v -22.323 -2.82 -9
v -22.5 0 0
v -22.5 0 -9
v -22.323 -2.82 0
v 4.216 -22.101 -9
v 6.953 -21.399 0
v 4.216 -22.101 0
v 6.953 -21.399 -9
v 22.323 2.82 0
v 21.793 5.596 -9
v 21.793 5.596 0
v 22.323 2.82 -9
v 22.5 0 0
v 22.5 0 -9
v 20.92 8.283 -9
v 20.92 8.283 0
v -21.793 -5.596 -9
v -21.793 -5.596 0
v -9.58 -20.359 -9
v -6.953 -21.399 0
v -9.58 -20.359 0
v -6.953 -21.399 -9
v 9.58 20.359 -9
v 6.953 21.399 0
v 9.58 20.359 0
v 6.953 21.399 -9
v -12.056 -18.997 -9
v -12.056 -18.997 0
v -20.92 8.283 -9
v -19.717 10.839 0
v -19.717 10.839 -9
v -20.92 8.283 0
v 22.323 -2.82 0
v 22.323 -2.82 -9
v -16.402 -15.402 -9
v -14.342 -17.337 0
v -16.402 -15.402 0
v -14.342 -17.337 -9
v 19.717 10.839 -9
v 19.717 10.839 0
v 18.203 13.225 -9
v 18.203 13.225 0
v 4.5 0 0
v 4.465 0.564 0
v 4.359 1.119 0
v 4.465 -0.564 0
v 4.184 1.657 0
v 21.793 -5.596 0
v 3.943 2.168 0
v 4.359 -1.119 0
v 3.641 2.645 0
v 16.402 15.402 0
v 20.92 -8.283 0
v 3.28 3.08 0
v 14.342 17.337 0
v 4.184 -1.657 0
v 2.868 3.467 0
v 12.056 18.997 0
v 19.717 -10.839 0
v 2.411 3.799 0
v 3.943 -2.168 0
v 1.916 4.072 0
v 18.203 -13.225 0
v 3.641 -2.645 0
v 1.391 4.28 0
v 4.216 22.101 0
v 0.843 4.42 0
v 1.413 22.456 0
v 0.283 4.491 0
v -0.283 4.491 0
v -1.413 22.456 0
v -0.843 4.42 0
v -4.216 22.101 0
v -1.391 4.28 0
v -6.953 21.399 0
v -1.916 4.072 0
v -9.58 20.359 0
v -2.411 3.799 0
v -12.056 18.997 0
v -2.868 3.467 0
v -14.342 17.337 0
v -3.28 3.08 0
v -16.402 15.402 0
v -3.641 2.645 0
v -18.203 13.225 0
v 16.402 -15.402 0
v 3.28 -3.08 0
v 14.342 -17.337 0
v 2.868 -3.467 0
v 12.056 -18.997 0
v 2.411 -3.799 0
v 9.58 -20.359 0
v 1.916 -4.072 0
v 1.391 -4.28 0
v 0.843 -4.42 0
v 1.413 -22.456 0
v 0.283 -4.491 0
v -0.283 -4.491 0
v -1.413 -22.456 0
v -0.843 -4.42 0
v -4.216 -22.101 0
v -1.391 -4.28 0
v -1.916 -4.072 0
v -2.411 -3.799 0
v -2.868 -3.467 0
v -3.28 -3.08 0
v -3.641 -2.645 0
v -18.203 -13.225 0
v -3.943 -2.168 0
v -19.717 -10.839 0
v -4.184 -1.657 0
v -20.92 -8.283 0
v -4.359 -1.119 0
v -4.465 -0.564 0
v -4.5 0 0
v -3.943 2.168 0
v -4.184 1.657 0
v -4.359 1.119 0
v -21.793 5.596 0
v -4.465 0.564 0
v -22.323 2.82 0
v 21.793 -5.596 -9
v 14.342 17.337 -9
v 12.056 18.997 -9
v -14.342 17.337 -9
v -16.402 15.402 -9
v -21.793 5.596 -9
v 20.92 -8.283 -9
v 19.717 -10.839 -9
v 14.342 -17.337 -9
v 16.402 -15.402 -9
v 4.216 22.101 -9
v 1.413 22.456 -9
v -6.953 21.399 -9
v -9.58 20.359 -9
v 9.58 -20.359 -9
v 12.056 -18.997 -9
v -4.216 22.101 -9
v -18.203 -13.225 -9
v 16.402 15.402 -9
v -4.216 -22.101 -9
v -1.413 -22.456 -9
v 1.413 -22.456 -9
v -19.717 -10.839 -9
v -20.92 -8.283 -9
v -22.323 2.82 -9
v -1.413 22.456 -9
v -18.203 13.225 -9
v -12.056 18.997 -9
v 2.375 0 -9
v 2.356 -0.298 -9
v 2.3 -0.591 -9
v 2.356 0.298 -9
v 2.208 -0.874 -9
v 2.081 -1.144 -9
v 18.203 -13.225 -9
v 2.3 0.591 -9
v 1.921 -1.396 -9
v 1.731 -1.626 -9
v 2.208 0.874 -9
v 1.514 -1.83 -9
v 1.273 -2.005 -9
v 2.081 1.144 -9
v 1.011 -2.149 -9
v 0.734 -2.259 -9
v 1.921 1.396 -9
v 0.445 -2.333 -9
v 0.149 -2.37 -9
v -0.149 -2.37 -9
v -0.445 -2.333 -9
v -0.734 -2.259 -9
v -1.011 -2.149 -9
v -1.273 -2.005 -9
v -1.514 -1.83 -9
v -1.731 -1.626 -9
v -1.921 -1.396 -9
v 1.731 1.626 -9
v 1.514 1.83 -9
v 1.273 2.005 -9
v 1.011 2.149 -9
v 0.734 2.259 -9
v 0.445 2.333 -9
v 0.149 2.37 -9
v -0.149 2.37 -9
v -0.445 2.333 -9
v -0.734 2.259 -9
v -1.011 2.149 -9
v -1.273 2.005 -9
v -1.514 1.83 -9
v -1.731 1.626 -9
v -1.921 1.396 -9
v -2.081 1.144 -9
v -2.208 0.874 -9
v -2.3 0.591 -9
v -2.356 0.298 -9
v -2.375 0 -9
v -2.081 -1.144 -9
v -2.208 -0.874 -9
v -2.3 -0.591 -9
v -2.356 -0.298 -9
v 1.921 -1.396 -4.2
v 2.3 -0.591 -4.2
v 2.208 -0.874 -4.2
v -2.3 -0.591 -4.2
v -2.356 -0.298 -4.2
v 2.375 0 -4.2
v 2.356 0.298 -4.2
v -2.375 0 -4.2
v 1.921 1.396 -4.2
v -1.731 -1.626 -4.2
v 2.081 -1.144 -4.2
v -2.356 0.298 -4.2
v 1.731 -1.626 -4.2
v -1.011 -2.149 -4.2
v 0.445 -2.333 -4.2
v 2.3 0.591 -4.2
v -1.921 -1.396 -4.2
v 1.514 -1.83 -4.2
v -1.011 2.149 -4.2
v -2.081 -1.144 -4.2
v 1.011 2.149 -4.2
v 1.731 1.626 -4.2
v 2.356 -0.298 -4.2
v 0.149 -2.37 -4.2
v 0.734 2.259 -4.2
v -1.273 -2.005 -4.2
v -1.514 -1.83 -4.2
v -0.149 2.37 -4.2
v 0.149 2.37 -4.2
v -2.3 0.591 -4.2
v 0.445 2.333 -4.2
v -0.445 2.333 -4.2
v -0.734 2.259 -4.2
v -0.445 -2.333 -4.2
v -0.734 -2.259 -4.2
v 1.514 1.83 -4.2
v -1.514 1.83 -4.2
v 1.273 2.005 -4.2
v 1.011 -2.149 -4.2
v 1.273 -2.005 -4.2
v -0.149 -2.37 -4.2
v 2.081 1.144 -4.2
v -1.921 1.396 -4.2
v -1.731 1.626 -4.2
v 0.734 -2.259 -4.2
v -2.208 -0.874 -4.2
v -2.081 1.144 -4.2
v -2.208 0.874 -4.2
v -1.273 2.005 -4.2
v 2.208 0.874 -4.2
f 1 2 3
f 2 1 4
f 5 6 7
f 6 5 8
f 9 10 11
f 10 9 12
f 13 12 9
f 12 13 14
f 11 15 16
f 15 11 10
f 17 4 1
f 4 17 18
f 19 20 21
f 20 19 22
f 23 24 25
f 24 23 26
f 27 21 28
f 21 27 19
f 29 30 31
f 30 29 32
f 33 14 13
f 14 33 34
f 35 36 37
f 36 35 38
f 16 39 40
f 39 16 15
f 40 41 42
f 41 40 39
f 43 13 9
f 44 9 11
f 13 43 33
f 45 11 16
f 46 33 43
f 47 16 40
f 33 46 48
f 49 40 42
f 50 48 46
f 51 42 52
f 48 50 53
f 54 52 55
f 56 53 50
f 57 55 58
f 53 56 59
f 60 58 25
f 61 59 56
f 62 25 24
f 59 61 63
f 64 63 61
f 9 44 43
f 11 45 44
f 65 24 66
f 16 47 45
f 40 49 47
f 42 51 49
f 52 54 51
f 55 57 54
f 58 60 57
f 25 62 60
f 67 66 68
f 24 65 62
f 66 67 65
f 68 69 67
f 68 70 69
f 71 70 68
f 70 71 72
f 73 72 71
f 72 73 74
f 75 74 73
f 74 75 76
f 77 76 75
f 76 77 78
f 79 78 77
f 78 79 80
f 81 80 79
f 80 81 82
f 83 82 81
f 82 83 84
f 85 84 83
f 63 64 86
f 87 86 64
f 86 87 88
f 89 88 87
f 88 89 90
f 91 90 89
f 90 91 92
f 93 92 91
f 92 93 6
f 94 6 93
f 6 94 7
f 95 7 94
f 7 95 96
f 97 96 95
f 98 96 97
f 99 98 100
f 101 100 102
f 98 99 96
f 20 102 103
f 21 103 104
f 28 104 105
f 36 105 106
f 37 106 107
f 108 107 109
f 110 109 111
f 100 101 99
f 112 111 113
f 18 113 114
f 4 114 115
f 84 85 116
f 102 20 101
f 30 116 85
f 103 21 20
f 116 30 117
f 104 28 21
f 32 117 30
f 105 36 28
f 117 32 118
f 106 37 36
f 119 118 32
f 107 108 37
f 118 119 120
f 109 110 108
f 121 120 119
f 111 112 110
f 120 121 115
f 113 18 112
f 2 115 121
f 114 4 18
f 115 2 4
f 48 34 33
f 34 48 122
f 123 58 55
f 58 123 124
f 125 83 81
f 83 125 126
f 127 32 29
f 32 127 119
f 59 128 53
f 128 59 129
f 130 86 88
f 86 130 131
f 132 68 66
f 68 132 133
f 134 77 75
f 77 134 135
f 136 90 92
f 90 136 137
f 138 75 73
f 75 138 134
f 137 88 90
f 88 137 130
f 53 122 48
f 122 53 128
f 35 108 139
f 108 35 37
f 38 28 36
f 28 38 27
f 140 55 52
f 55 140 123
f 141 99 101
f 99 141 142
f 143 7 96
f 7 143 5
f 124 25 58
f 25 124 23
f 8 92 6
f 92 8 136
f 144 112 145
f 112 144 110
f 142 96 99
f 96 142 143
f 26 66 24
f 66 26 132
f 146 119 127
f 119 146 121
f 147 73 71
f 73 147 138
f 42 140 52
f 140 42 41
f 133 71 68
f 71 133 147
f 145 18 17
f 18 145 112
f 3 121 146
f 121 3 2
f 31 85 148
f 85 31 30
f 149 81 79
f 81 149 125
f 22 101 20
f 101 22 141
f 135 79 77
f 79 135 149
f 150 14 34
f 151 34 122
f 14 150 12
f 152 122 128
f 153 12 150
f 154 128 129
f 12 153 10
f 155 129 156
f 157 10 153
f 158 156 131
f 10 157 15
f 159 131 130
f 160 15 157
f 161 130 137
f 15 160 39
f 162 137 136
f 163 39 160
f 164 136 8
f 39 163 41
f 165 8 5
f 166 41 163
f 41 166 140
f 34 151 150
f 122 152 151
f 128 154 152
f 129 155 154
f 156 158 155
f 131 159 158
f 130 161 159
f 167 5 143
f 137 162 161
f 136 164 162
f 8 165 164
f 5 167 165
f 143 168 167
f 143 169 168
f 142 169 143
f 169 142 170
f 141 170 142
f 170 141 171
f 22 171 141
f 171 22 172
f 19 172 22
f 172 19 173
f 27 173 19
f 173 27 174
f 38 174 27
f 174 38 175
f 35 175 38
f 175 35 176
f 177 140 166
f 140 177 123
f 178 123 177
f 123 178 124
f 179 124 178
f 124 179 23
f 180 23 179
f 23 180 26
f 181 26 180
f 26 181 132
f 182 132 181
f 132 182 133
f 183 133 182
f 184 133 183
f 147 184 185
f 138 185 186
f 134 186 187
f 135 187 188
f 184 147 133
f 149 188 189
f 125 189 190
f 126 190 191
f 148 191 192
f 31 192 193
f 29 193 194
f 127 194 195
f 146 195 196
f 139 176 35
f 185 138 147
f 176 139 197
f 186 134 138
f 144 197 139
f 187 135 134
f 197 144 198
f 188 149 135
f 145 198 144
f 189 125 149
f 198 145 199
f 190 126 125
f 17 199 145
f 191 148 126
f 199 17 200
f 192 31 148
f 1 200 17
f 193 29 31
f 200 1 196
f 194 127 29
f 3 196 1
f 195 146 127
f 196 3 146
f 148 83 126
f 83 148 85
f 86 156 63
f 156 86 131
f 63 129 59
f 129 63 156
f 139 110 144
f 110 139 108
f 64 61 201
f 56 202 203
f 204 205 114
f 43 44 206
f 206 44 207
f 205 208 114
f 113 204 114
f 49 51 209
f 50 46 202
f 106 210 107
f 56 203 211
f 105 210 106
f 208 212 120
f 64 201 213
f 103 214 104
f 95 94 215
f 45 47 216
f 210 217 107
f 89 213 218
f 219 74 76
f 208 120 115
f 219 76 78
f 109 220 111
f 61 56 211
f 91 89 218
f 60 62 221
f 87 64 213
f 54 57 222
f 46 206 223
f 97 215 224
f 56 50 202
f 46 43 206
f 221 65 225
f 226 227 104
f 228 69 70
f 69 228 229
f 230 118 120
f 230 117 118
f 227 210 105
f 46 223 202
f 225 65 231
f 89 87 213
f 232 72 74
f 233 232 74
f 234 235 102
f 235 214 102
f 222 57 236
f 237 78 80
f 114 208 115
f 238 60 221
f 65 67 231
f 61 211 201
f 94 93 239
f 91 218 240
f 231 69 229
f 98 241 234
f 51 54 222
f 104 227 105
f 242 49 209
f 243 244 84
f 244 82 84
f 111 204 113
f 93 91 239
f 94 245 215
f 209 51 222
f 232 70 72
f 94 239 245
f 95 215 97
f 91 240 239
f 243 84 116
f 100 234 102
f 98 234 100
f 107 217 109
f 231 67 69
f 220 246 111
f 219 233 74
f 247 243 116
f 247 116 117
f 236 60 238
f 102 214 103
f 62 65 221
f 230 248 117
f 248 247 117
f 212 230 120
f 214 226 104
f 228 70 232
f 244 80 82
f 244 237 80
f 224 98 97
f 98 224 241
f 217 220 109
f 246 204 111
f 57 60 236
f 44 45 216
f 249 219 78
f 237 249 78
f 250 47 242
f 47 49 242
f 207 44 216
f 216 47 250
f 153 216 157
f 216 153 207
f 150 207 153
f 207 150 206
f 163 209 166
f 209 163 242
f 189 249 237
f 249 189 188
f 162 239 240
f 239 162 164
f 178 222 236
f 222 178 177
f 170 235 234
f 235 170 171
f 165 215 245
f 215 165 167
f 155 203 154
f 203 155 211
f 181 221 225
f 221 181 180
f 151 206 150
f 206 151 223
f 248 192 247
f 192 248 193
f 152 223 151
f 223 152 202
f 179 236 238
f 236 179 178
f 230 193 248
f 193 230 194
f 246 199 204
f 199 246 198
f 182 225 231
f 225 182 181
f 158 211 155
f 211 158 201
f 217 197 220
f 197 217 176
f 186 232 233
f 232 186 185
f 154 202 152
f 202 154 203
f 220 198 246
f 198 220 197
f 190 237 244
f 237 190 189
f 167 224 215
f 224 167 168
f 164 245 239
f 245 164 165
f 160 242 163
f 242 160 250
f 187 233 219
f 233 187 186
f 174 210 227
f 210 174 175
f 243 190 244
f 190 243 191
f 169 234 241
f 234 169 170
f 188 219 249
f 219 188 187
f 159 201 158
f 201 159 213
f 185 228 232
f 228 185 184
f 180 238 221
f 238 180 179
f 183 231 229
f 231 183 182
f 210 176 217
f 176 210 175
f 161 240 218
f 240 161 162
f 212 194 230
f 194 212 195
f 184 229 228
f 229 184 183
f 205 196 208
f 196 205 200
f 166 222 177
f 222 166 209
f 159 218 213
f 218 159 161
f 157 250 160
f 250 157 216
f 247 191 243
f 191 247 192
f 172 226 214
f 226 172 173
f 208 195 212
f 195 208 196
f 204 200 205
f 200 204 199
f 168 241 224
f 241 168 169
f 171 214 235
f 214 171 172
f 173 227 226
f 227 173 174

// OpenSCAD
$fn = 50;


difference() {
	union() {
		translate(v = [0, 0, -9.0000000000]) {
			cylinder(h = 9, r = 22.5000000000);
		}
		translate(v = [0, 0, -9.0000000000]) {
			cylinder(h = 9, r = 2.8750000000);
		}
	}
	union() {
		translate(v = [0, 0, 0]) {
			rotate(a = [0, 0, 0]) {
				difference() {
					union() {
						#translate(v = [0, 0, -9.0000000000]) {
							cylinder(h = 9, r = 2.2500000000);
						}
						#translate(v = [0, 0, -4.2000000000]) {
							cylinder(h = 4.2000000000, r1 = 2.3750000000, r2 = 4.5000000000);
						}
						#translate(v = [0, 0, -9.0000000000]) {
							cylinder(h = 9, r = 2.3750000000);
						}
						#translate(v = [0, 0, -9.0000000000]) {
							cylinder(h = 9, r = 2.2500000000);
						}
					}
					union();
				}
			}
		}
	}
}
